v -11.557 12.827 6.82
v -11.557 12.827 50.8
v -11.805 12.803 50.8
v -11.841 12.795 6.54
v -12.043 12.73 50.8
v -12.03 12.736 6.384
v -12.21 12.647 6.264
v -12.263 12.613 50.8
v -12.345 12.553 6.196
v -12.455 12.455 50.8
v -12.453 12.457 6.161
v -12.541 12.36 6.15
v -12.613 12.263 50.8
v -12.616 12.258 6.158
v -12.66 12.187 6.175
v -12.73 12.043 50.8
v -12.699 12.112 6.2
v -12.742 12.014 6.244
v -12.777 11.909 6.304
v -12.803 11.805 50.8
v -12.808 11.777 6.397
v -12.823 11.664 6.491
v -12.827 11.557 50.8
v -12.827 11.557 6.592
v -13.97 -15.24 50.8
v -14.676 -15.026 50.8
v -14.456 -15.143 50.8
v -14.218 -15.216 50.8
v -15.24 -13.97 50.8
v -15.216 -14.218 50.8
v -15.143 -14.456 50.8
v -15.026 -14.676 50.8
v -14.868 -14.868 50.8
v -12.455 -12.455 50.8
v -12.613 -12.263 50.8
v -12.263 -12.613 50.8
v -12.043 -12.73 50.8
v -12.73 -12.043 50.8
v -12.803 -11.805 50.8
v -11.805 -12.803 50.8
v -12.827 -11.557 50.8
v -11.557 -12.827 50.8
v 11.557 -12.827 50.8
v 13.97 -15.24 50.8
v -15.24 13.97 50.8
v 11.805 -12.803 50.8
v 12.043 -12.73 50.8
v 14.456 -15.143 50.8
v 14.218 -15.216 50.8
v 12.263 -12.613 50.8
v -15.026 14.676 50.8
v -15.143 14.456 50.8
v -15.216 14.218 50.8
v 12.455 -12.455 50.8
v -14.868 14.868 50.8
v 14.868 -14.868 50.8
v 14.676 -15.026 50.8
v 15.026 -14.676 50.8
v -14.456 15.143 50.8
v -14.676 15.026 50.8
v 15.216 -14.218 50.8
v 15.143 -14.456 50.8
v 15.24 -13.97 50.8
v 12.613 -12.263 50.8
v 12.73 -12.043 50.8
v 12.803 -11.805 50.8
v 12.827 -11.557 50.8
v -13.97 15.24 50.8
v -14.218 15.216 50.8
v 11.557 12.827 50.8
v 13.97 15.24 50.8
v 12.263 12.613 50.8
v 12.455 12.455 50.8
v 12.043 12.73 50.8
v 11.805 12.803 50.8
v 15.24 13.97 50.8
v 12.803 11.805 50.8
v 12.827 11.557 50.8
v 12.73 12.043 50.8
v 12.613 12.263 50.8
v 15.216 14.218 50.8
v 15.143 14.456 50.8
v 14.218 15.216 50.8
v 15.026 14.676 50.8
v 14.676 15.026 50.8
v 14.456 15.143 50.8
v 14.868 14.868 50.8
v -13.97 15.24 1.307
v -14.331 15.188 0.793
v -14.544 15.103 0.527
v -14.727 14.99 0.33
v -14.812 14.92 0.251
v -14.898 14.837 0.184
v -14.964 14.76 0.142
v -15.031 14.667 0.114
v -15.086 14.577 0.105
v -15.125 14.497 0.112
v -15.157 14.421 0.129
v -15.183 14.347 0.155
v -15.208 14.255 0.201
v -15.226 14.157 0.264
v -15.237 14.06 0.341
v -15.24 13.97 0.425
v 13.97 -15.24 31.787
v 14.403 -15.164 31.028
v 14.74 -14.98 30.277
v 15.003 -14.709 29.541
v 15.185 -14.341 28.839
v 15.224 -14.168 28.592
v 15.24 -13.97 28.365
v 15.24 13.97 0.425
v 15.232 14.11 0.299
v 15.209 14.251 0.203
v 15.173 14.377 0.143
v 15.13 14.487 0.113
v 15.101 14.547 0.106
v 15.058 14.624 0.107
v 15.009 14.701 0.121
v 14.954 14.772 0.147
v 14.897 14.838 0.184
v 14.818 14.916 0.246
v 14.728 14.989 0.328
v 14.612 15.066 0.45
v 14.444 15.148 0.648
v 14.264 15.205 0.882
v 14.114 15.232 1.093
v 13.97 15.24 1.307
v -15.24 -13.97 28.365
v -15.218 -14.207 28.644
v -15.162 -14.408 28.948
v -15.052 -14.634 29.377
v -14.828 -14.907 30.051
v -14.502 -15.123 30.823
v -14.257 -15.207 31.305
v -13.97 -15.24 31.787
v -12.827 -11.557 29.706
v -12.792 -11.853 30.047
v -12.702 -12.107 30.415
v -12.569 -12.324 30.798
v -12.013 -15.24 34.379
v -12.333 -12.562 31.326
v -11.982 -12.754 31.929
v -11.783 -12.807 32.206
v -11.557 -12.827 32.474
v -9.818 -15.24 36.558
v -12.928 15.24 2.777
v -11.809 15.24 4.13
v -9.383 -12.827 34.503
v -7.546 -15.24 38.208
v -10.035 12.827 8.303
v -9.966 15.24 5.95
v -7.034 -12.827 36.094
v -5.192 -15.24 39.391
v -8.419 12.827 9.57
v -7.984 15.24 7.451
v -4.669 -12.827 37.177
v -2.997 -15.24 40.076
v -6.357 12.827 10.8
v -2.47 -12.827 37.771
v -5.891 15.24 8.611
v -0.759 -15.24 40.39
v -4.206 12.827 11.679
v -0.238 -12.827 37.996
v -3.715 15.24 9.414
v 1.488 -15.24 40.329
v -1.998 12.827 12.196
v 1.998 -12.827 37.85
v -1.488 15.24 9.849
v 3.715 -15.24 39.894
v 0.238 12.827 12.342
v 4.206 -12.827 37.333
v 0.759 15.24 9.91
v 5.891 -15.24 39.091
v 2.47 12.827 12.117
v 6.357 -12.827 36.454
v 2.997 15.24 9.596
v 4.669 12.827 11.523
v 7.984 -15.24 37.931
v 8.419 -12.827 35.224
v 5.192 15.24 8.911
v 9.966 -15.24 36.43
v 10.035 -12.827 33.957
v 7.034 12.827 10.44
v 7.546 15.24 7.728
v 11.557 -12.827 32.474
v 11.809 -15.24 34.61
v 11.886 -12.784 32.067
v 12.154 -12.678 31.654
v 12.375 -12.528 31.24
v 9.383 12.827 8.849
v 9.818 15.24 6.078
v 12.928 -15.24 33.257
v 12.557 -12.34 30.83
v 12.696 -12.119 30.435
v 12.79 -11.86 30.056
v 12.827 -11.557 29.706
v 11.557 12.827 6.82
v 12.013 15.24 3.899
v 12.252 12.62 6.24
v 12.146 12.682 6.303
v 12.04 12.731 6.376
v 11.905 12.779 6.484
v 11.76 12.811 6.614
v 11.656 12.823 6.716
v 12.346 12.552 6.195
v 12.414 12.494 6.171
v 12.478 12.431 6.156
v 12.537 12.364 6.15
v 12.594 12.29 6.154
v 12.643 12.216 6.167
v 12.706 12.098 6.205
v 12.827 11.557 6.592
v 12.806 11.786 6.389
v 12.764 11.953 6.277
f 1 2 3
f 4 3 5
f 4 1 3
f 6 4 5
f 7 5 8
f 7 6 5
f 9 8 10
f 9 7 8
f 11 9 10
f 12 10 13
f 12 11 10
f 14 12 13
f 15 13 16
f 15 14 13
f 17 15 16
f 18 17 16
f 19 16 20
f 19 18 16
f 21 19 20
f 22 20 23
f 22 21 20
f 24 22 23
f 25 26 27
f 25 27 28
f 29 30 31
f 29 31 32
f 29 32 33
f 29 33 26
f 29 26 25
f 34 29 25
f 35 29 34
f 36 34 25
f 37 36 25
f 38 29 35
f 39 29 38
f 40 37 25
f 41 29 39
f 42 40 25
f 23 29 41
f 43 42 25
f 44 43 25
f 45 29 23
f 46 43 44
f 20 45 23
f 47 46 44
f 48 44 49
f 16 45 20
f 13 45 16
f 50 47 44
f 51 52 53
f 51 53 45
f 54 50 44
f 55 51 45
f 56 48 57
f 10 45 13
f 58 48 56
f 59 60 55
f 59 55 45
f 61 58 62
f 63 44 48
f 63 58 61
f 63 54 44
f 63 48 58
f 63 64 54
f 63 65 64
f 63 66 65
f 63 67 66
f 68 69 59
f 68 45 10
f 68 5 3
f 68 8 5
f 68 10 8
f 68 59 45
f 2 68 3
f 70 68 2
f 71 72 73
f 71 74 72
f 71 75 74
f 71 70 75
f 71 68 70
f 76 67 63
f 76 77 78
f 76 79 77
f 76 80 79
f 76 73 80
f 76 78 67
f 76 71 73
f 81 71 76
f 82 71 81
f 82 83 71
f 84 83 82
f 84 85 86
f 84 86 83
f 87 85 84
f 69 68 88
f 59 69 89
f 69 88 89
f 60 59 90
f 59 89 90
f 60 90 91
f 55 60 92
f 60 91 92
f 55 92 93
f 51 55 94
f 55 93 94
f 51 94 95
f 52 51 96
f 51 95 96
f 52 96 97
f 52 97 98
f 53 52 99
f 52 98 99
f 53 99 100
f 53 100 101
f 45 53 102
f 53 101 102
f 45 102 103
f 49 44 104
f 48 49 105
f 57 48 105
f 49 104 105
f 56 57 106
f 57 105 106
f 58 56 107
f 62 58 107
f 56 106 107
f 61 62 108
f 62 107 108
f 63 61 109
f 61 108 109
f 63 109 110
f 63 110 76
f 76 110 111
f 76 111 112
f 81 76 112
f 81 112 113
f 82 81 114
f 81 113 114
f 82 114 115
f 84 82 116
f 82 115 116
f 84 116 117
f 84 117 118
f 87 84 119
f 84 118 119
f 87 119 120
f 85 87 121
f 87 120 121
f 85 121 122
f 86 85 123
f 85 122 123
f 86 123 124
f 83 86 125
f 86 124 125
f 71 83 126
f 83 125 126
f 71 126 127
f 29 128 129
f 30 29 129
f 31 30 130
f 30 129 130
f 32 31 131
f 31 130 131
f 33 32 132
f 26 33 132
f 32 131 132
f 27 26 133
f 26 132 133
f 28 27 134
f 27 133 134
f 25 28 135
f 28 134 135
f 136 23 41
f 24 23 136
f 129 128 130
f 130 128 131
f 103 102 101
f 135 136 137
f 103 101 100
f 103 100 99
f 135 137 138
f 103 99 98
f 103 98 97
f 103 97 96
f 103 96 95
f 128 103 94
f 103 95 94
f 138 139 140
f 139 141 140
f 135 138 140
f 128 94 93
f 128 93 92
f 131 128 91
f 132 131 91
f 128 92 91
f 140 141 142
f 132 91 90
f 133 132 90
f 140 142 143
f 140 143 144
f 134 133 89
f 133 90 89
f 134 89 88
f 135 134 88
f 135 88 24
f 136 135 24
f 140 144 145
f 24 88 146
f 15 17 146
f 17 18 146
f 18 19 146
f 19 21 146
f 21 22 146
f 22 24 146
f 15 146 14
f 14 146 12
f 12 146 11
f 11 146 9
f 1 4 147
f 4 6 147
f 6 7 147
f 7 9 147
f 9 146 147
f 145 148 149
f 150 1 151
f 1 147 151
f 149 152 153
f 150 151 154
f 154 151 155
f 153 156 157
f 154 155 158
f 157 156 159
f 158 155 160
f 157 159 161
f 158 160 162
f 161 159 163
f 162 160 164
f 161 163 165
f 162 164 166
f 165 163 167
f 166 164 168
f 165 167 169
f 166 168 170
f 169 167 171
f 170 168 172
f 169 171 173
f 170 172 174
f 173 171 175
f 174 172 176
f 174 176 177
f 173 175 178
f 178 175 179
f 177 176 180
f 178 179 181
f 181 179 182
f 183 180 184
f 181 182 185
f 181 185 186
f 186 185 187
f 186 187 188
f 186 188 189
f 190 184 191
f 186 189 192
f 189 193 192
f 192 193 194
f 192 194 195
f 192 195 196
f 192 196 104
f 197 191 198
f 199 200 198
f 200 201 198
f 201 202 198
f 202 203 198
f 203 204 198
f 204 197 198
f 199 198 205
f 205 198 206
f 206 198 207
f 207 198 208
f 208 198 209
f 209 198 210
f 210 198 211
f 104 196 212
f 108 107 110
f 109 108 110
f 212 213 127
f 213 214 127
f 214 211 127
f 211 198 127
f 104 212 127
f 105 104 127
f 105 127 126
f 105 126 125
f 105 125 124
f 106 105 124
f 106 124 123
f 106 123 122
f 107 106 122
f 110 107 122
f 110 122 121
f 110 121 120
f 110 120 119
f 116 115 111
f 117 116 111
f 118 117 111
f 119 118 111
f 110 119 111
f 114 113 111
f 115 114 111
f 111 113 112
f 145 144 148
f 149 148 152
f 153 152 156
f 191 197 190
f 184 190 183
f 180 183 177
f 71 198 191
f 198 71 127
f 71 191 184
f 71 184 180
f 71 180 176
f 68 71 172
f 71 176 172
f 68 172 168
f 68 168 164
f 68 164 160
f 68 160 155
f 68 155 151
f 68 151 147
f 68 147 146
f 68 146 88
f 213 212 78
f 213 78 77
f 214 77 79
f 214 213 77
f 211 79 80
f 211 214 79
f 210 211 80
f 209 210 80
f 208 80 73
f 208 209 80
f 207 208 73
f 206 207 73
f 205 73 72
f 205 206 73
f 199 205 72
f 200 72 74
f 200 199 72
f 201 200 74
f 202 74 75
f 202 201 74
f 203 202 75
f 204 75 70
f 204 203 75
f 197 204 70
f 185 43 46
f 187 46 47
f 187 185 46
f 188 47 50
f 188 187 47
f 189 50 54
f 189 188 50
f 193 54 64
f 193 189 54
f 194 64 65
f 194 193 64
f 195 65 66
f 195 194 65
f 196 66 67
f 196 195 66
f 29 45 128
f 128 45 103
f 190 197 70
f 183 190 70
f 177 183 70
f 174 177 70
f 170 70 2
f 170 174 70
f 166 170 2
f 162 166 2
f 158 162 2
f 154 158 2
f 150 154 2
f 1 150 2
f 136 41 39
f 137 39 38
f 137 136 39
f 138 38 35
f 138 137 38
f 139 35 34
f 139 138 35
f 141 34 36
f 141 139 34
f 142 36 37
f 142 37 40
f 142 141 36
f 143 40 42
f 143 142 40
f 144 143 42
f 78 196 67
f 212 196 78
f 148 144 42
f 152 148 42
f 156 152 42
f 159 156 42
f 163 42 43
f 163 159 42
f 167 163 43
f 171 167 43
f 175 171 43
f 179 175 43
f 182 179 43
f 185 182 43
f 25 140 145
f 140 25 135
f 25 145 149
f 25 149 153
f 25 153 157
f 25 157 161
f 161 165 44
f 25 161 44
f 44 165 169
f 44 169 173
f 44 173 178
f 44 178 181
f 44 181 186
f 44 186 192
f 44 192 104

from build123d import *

# Parameters (mm, degrees)
BOSS_EXTRUDE1_DEPTH = 50.8
SKETCH3_R           = 19.05
CUT_EXTRUDE1_DEPTH  = 65.557986338


with BuildPart() as part:
    # Sketch2 → Boss-Extrude1 (new body)
    with BuildSketch(Plane.XY):
        with BuildLine():
            Line((-13.97, -15.24), (13.97, -15.24))
            ThreePointArc((13.97, -15.24), (14.868025612, -14.868025612), (15.24, -13.97))
            Line((15.24, -13.97), (15.24, 13.97))
            ThreePointArc((15.24, 13.97), (14.868025612, 14.868025612), (13.97, 15.24))
            Line((13.97, 15.24), (-13.97, 15.24))
            ThreePointArc((-13.97, 15.24), (-14.868025612, 14.868025612), (-15.24, 13.97))
            Line((-15.24, 13.97), (-15.24, -13.97))
            ThreePointArc((-15.24, -13.97), (-14.868025612, -14.868025612), (-13.97, -15.24))
        make_face()
        with BuildLine():
            Line((-11.557, -12.827), (11.557, -12.827))
            ThreePointArc((11.557, -12.827), (12.455025612, -12.455025612), (12.827, -11.557))
            Line((12.827, -11.557), (12.827, 11.557))
            ThreePointArc((12.827, 11.557), (12.455025612, 12.455025612), (11.557, 12.827))
            Line((11.557, 12.827), (-11.557, 12.827))
            ThreePointArc((-11.557, 12.827), (-12.455025612, 12.455025612), (-12.827, 11.557))
            Line((-12.827, 11.557), (-12.827, -11.557))
            ThreePointArc((-12.827, -11.557), (-12.455025612, -12.455025612), (-11.557, -12.827))
        make_face(mode=Mode.SUBTRACT)
    extrude(amount=BOSS_EXTRUDE1_DEPTH)

    # Sketch3 → Cut-Extrude1 (cut, through all)
    with BuildSketch(Plane(origin=(0, 7.62, -7.62), x_dir=(-1, 0, 0), z_dir=(0, 0.7071067811865464, -0.7071067811865488))):
        with Locations((0, -1.251307345)):
            Circle(SKETCH3_R)
    extrude(amount=-CUT_EXTRUDE1_DEPTH, mode=Mode.SUBTRACT)


solid = part.part
